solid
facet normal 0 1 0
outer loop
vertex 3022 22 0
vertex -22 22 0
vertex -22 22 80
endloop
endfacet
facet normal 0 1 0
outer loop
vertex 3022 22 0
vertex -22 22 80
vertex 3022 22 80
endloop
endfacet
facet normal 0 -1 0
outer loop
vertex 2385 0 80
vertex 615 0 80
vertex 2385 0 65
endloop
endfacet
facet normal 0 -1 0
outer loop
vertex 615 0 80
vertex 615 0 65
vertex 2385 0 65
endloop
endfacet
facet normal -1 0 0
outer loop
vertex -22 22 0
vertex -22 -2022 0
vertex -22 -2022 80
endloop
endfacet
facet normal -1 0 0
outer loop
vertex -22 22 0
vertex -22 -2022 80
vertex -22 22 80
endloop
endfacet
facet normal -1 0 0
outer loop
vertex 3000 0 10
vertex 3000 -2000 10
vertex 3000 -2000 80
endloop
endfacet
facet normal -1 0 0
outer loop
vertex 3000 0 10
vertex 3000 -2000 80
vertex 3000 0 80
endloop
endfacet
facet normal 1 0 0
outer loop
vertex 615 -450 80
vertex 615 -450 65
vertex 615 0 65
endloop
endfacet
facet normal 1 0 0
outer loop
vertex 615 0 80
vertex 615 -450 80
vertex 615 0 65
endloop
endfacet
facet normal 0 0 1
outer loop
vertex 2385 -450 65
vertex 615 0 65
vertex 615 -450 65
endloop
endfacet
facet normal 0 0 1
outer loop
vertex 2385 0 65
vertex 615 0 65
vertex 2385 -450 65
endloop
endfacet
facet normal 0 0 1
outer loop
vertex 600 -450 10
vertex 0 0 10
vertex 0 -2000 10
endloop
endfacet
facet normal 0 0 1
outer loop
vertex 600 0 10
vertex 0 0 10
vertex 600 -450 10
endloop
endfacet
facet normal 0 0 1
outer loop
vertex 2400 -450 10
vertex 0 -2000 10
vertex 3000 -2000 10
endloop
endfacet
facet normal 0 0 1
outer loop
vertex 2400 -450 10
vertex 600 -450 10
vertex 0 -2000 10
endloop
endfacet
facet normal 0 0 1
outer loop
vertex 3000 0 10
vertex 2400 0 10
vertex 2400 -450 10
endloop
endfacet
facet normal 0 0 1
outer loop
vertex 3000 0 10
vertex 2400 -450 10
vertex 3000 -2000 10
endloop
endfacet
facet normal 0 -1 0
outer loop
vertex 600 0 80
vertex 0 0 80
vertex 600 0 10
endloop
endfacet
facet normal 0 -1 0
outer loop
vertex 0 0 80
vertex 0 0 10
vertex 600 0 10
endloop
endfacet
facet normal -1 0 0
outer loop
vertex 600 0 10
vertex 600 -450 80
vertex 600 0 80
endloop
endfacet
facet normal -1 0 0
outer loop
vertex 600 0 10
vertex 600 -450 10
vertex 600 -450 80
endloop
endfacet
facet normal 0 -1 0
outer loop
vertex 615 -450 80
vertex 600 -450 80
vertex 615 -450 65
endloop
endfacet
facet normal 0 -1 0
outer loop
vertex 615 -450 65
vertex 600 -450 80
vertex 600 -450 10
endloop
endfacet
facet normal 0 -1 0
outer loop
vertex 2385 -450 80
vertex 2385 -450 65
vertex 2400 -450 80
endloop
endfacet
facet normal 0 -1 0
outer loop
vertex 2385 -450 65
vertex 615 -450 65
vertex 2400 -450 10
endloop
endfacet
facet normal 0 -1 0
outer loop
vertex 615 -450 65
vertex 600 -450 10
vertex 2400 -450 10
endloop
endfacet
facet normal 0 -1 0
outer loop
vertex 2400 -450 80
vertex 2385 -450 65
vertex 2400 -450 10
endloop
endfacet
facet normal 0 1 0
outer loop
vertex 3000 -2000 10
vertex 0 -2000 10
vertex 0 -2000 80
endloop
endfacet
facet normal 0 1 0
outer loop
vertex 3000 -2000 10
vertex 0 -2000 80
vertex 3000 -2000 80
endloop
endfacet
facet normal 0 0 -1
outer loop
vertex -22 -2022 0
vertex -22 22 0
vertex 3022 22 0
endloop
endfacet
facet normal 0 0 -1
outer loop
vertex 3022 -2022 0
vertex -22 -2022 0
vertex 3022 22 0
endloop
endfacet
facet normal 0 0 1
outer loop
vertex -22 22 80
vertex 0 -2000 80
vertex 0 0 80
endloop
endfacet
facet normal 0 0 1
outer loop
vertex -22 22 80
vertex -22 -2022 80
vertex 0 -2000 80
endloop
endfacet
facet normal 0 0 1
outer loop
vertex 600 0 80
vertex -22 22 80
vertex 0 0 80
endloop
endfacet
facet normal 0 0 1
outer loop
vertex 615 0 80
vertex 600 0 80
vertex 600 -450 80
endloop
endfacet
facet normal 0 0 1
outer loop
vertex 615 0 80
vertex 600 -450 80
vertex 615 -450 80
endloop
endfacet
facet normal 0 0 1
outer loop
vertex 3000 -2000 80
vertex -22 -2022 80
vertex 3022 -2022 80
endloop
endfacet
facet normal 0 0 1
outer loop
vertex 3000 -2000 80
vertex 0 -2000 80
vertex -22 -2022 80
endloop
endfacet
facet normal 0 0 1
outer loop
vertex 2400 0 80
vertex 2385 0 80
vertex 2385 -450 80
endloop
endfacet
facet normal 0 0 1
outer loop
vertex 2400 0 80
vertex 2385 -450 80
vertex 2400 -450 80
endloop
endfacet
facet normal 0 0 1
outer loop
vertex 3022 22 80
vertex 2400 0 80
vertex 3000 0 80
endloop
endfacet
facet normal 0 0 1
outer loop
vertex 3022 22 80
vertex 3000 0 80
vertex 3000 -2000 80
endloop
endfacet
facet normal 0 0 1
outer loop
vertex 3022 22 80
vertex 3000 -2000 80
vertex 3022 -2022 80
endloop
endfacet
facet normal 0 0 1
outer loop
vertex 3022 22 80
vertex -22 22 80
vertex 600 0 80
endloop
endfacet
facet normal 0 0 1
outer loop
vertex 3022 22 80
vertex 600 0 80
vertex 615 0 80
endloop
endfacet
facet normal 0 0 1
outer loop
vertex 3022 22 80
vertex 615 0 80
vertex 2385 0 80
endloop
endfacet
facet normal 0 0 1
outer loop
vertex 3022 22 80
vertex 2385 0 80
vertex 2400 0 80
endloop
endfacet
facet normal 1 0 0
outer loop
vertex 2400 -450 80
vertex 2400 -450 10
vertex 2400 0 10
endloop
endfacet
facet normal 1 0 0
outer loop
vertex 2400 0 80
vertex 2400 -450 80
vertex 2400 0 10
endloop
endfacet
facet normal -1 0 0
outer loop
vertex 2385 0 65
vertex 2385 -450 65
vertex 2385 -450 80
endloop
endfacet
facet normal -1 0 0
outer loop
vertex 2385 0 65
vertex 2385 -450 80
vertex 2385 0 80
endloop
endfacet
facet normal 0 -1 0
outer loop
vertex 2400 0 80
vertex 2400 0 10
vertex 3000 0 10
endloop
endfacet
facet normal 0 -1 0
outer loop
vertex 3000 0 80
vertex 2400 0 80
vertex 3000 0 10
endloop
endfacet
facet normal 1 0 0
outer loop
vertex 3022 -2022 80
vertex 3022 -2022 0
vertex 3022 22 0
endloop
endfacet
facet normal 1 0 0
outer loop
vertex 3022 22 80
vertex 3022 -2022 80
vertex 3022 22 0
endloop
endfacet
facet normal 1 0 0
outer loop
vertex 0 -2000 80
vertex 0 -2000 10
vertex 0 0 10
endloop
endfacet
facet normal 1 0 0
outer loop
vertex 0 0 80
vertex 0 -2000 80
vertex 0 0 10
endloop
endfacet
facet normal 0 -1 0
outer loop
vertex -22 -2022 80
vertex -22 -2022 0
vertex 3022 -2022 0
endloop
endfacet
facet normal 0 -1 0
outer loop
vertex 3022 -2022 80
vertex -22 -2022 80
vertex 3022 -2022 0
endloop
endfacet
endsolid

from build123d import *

# Parameters (mm, degrees)
SKETCH1_W           = 3044
SKETCH1_H           = 2044
BOSS_EXTRUDE1_DEPTH = 10
SKETCH1_3_W         = 3044
SKETCH1_3_H         = 2044
SKETCH1_3_W_2       = 3000
SKETCH1_3_H_2       = 2000
BOSS_EXTRUDE2_DEPTH = 80
SKETCH7_W           = 1800
SKETCH7_H           = 450
BOSS_EXTRUDE3_DEPTH = 55
SKETCH8_W           = 15
SKETCH8_H           = 450
BOSS_EXTRUDE4_DEPTH = 15


with BuildPart() as part:
    # Sketch1 → Boss-Extrude1 (new body)
    with BuildSketch(Plane.XY):
        with Locations((1500, -1000)):
            Rectangle(SKETCH1_W, SKETCH1_H)
    extrude(amount=BOSS_EXTRUDE1_DEPTH)

    # Sketch1<3> → Boss-Extrude2 (add)
    with BuildSketch(Plane.XY):
        with Locations((1500, -1000)):
            Rectangle(SKETCH1_3_W, SKETCH1_3_H)
        with Locations((1500, -1000)):
            Rectangle(SKETCH1_3_W_2, SKETCH1_3_H_2, mode=Mode.SUBTRACT)
    extrude(amount=BOSS_EXTRUDE2_DEPTH)

    # Sketch7 → Boss-Extrude3 (add)
    with BuildSketch(Plane.XY.offset(10)):
        with Locations((1500, -225)):
            Rectangle(SKETCH7_W, SKETCH7_H)
    extrude(amount=BOSS_EXTRUDE3_DEPTH)

    # Sketch8 → Boss-Extrude4 (add)
    with BuildSketch(Plane.XY.offset(65)):
        with Locations((607.5, -225)):
            Rectangle(SKETCH8_W, SKETCH8_H)
        with Locations((2392.5, -225)):
            Rectangle(SKETCH8_W, SKETCH8_H)
    extrude(amount=BOSS_EXTRUDE4_DEPTH)


solid = part.part
